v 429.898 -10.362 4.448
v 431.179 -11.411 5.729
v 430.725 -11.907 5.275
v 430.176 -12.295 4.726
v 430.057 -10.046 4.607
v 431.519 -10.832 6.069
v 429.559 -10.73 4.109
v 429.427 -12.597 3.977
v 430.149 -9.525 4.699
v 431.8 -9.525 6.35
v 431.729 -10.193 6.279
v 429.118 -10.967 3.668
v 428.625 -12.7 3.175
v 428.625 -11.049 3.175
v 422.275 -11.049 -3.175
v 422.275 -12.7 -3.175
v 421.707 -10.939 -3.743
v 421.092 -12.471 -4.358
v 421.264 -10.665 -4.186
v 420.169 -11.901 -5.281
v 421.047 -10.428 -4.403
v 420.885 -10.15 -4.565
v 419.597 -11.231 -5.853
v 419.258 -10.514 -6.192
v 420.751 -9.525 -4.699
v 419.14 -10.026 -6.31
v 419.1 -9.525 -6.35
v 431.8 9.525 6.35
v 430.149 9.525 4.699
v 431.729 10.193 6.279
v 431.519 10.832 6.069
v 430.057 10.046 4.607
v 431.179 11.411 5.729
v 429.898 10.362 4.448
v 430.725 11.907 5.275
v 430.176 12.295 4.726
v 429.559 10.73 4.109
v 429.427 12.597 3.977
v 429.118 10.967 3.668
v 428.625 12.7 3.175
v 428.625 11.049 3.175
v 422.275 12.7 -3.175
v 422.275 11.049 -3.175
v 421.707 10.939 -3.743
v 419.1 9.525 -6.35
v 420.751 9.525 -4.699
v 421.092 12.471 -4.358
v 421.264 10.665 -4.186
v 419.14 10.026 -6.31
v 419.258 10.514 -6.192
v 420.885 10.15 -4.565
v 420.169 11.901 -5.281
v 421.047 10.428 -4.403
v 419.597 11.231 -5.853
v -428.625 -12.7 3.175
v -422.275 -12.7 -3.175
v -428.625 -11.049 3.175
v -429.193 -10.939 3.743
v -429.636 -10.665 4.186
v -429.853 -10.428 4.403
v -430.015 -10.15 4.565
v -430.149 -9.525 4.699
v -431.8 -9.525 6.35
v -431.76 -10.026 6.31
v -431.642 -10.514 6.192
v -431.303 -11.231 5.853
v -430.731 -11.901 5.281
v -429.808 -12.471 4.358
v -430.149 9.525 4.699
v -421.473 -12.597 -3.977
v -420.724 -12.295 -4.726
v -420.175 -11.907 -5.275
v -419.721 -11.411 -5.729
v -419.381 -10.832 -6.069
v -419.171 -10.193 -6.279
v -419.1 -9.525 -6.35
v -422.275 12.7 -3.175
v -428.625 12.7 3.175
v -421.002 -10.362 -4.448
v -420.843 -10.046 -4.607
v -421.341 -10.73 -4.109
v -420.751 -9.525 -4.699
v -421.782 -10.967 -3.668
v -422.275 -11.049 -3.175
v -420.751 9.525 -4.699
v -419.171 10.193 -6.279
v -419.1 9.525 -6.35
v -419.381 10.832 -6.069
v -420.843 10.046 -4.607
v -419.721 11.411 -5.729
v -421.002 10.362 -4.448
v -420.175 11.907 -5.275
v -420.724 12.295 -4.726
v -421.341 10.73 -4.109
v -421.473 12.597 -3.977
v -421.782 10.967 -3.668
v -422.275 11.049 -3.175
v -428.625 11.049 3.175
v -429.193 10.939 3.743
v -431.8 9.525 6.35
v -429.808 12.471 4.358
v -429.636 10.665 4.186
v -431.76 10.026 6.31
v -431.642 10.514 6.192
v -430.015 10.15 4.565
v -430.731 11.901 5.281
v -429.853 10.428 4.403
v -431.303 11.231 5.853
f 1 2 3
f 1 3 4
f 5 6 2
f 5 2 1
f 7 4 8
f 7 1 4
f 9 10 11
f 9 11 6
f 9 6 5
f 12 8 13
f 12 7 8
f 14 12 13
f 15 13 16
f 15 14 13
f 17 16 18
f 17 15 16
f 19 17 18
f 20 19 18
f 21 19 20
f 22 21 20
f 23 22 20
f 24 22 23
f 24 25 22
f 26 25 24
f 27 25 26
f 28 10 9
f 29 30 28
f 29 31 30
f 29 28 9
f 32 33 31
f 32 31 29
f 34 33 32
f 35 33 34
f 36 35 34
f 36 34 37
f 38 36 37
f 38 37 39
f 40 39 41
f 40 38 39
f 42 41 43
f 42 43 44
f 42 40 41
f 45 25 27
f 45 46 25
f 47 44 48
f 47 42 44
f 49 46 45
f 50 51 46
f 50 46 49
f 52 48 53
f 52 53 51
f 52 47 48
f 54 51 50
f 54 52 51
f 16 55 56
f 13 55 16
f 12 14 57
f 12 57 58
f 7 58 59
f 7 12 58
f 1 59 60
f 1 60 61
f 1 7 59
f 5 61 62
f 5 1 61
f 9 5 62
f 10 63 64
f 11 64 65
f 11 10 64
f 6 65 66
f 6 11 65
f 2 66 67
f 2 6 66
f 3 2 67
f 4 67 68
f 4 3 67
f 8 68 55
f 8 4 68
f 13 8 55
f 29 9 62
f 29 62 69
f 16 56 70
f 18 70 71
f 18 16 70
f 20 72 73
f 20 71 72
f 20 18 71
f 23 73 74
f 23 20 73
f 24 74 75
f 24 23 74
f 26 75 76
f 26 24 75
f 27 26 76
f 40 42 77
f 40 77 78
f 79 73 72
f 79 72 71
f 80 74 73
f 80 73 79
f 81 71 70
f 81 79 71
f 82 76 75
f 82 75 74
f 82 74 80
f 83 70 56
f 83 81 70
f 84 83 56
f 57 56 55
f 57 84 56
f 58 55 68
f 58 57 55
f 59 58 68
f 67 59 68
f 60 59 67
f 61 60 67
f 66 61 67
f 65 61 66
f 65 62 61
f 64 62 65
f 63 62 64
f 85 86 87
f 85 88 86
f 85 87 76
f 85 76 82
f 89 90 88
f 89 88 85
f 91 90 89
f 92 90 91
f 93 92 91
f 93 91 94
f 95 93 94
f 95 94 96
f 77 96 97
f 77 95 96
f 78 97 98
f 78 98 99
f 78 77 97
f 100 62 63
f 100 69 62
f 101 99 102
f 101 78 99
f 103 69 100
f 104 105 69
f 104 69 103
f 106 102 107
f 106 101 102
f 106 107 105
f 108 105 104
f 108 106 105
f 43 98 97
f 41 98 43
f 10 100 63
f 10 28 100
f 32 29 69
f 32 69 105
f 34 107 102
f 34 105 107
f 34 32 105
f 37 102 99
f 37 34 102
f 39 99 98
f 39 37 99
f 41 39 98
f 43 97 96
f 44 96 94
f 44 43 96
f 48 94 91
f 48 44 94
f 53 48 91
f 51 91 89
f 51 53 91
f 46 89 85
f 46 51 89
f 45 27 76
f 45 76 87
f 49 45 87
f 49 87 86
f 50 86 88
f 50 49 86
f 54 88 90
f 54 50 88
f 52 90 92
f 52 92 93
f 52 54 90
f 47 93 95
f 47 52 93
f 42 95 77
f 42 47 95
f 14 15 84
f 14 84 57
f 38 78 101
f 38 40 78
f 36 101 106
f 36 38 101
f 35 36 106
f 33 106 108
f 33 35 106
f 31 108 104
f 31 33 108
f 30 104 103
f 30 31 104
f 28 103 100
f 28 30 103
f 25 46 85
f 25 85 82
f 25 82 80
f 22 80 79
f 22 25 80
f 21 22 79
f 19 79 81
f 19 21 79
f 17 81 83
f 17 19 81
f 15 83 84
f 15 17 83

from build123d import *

# Parameters (mm, degrees)
F1_DEPTH      = 431.8
F3_DEPTH      = 12.701
F3_DEPTH_BACK = 12.701


with BuildPart() as f1:
    # F0 (on Right) → F1 (new body, symmetric)
    with BuildSketch(Plane.YZ):
        with BuildLine():
            Line((-12.7, 3.175), (-12.7, -3.175))
            ThreePointArc((-12.7, -3.175), (-11.7700640303, -5.4200640303), (-9.525, -6.35))
            Line((-9.525, -6.35), (9.525, -6.35))
            ThreePointArc((9.525, -6.35), (11.7700640303, -5.4200640303), (12.7, -3.175))
            Line((12.7, -3.175), (12.7, 3.175))
            ThreePointArc((12.7, 3.175), (11.7700640303, 5.4200640303), (9.525, 6.35))
            Line((9.525, 6.35), (-9.525, 6.35))
            ThreePointArc((-9.525, 6.35), (-11.7700640303, 5.4200640303), (-12.7, 3.175))
        make_face()
        with BuildLine():
            ThreePointArc((-11.049, 3.175), (-10.6026307345, 4.2526307345), (-9.525, 4.699))
            Line((-9.525, 4.699), (9.525, 4.699))
            ThreePointArc((9.525, 4.699), (10.6026307345, 4.2526307345), (11.049, 3.175))
            Line((11.049, 3.175), (11.049, -3.175))
            ThreePointArc((11.049, -3.175), (10.6026307345, -4.2526307345), (9.525, -4.699))
            Line((9.525, -4.699), (-9.525, -4.699))
            ThreePointArc((-9.525, -4.699), (-10.6026307345, -4.2526307345), (-11.049, -3.175))
            Line((-11.049, -3.175), (-11.049, 3.175))
        make_face(mode=Mode.SUBTRACT)
    extrude(amount=F1_DEPTH, both=True)

    # F2 (on Front) → F3 (cut, two sides)
    with BuildSketch(Plane.XZ) as f3_sk:
        Polygon((-431.8, 6.35), (-431.8, -6.35), (-419.1, -6.35), align=None)
        Polygon((419.1, -6.35), (431.8, -6.35), (431.8, 6.35), align=None)
    extrude(amount=-F3_DEPTH, mode=Mode.SUBTRACT)
    extrude(f3_sk.sketch, amount=F3_DEPTH_BACK, mode=Mode.SUBTRACT)


solid = f1.part
